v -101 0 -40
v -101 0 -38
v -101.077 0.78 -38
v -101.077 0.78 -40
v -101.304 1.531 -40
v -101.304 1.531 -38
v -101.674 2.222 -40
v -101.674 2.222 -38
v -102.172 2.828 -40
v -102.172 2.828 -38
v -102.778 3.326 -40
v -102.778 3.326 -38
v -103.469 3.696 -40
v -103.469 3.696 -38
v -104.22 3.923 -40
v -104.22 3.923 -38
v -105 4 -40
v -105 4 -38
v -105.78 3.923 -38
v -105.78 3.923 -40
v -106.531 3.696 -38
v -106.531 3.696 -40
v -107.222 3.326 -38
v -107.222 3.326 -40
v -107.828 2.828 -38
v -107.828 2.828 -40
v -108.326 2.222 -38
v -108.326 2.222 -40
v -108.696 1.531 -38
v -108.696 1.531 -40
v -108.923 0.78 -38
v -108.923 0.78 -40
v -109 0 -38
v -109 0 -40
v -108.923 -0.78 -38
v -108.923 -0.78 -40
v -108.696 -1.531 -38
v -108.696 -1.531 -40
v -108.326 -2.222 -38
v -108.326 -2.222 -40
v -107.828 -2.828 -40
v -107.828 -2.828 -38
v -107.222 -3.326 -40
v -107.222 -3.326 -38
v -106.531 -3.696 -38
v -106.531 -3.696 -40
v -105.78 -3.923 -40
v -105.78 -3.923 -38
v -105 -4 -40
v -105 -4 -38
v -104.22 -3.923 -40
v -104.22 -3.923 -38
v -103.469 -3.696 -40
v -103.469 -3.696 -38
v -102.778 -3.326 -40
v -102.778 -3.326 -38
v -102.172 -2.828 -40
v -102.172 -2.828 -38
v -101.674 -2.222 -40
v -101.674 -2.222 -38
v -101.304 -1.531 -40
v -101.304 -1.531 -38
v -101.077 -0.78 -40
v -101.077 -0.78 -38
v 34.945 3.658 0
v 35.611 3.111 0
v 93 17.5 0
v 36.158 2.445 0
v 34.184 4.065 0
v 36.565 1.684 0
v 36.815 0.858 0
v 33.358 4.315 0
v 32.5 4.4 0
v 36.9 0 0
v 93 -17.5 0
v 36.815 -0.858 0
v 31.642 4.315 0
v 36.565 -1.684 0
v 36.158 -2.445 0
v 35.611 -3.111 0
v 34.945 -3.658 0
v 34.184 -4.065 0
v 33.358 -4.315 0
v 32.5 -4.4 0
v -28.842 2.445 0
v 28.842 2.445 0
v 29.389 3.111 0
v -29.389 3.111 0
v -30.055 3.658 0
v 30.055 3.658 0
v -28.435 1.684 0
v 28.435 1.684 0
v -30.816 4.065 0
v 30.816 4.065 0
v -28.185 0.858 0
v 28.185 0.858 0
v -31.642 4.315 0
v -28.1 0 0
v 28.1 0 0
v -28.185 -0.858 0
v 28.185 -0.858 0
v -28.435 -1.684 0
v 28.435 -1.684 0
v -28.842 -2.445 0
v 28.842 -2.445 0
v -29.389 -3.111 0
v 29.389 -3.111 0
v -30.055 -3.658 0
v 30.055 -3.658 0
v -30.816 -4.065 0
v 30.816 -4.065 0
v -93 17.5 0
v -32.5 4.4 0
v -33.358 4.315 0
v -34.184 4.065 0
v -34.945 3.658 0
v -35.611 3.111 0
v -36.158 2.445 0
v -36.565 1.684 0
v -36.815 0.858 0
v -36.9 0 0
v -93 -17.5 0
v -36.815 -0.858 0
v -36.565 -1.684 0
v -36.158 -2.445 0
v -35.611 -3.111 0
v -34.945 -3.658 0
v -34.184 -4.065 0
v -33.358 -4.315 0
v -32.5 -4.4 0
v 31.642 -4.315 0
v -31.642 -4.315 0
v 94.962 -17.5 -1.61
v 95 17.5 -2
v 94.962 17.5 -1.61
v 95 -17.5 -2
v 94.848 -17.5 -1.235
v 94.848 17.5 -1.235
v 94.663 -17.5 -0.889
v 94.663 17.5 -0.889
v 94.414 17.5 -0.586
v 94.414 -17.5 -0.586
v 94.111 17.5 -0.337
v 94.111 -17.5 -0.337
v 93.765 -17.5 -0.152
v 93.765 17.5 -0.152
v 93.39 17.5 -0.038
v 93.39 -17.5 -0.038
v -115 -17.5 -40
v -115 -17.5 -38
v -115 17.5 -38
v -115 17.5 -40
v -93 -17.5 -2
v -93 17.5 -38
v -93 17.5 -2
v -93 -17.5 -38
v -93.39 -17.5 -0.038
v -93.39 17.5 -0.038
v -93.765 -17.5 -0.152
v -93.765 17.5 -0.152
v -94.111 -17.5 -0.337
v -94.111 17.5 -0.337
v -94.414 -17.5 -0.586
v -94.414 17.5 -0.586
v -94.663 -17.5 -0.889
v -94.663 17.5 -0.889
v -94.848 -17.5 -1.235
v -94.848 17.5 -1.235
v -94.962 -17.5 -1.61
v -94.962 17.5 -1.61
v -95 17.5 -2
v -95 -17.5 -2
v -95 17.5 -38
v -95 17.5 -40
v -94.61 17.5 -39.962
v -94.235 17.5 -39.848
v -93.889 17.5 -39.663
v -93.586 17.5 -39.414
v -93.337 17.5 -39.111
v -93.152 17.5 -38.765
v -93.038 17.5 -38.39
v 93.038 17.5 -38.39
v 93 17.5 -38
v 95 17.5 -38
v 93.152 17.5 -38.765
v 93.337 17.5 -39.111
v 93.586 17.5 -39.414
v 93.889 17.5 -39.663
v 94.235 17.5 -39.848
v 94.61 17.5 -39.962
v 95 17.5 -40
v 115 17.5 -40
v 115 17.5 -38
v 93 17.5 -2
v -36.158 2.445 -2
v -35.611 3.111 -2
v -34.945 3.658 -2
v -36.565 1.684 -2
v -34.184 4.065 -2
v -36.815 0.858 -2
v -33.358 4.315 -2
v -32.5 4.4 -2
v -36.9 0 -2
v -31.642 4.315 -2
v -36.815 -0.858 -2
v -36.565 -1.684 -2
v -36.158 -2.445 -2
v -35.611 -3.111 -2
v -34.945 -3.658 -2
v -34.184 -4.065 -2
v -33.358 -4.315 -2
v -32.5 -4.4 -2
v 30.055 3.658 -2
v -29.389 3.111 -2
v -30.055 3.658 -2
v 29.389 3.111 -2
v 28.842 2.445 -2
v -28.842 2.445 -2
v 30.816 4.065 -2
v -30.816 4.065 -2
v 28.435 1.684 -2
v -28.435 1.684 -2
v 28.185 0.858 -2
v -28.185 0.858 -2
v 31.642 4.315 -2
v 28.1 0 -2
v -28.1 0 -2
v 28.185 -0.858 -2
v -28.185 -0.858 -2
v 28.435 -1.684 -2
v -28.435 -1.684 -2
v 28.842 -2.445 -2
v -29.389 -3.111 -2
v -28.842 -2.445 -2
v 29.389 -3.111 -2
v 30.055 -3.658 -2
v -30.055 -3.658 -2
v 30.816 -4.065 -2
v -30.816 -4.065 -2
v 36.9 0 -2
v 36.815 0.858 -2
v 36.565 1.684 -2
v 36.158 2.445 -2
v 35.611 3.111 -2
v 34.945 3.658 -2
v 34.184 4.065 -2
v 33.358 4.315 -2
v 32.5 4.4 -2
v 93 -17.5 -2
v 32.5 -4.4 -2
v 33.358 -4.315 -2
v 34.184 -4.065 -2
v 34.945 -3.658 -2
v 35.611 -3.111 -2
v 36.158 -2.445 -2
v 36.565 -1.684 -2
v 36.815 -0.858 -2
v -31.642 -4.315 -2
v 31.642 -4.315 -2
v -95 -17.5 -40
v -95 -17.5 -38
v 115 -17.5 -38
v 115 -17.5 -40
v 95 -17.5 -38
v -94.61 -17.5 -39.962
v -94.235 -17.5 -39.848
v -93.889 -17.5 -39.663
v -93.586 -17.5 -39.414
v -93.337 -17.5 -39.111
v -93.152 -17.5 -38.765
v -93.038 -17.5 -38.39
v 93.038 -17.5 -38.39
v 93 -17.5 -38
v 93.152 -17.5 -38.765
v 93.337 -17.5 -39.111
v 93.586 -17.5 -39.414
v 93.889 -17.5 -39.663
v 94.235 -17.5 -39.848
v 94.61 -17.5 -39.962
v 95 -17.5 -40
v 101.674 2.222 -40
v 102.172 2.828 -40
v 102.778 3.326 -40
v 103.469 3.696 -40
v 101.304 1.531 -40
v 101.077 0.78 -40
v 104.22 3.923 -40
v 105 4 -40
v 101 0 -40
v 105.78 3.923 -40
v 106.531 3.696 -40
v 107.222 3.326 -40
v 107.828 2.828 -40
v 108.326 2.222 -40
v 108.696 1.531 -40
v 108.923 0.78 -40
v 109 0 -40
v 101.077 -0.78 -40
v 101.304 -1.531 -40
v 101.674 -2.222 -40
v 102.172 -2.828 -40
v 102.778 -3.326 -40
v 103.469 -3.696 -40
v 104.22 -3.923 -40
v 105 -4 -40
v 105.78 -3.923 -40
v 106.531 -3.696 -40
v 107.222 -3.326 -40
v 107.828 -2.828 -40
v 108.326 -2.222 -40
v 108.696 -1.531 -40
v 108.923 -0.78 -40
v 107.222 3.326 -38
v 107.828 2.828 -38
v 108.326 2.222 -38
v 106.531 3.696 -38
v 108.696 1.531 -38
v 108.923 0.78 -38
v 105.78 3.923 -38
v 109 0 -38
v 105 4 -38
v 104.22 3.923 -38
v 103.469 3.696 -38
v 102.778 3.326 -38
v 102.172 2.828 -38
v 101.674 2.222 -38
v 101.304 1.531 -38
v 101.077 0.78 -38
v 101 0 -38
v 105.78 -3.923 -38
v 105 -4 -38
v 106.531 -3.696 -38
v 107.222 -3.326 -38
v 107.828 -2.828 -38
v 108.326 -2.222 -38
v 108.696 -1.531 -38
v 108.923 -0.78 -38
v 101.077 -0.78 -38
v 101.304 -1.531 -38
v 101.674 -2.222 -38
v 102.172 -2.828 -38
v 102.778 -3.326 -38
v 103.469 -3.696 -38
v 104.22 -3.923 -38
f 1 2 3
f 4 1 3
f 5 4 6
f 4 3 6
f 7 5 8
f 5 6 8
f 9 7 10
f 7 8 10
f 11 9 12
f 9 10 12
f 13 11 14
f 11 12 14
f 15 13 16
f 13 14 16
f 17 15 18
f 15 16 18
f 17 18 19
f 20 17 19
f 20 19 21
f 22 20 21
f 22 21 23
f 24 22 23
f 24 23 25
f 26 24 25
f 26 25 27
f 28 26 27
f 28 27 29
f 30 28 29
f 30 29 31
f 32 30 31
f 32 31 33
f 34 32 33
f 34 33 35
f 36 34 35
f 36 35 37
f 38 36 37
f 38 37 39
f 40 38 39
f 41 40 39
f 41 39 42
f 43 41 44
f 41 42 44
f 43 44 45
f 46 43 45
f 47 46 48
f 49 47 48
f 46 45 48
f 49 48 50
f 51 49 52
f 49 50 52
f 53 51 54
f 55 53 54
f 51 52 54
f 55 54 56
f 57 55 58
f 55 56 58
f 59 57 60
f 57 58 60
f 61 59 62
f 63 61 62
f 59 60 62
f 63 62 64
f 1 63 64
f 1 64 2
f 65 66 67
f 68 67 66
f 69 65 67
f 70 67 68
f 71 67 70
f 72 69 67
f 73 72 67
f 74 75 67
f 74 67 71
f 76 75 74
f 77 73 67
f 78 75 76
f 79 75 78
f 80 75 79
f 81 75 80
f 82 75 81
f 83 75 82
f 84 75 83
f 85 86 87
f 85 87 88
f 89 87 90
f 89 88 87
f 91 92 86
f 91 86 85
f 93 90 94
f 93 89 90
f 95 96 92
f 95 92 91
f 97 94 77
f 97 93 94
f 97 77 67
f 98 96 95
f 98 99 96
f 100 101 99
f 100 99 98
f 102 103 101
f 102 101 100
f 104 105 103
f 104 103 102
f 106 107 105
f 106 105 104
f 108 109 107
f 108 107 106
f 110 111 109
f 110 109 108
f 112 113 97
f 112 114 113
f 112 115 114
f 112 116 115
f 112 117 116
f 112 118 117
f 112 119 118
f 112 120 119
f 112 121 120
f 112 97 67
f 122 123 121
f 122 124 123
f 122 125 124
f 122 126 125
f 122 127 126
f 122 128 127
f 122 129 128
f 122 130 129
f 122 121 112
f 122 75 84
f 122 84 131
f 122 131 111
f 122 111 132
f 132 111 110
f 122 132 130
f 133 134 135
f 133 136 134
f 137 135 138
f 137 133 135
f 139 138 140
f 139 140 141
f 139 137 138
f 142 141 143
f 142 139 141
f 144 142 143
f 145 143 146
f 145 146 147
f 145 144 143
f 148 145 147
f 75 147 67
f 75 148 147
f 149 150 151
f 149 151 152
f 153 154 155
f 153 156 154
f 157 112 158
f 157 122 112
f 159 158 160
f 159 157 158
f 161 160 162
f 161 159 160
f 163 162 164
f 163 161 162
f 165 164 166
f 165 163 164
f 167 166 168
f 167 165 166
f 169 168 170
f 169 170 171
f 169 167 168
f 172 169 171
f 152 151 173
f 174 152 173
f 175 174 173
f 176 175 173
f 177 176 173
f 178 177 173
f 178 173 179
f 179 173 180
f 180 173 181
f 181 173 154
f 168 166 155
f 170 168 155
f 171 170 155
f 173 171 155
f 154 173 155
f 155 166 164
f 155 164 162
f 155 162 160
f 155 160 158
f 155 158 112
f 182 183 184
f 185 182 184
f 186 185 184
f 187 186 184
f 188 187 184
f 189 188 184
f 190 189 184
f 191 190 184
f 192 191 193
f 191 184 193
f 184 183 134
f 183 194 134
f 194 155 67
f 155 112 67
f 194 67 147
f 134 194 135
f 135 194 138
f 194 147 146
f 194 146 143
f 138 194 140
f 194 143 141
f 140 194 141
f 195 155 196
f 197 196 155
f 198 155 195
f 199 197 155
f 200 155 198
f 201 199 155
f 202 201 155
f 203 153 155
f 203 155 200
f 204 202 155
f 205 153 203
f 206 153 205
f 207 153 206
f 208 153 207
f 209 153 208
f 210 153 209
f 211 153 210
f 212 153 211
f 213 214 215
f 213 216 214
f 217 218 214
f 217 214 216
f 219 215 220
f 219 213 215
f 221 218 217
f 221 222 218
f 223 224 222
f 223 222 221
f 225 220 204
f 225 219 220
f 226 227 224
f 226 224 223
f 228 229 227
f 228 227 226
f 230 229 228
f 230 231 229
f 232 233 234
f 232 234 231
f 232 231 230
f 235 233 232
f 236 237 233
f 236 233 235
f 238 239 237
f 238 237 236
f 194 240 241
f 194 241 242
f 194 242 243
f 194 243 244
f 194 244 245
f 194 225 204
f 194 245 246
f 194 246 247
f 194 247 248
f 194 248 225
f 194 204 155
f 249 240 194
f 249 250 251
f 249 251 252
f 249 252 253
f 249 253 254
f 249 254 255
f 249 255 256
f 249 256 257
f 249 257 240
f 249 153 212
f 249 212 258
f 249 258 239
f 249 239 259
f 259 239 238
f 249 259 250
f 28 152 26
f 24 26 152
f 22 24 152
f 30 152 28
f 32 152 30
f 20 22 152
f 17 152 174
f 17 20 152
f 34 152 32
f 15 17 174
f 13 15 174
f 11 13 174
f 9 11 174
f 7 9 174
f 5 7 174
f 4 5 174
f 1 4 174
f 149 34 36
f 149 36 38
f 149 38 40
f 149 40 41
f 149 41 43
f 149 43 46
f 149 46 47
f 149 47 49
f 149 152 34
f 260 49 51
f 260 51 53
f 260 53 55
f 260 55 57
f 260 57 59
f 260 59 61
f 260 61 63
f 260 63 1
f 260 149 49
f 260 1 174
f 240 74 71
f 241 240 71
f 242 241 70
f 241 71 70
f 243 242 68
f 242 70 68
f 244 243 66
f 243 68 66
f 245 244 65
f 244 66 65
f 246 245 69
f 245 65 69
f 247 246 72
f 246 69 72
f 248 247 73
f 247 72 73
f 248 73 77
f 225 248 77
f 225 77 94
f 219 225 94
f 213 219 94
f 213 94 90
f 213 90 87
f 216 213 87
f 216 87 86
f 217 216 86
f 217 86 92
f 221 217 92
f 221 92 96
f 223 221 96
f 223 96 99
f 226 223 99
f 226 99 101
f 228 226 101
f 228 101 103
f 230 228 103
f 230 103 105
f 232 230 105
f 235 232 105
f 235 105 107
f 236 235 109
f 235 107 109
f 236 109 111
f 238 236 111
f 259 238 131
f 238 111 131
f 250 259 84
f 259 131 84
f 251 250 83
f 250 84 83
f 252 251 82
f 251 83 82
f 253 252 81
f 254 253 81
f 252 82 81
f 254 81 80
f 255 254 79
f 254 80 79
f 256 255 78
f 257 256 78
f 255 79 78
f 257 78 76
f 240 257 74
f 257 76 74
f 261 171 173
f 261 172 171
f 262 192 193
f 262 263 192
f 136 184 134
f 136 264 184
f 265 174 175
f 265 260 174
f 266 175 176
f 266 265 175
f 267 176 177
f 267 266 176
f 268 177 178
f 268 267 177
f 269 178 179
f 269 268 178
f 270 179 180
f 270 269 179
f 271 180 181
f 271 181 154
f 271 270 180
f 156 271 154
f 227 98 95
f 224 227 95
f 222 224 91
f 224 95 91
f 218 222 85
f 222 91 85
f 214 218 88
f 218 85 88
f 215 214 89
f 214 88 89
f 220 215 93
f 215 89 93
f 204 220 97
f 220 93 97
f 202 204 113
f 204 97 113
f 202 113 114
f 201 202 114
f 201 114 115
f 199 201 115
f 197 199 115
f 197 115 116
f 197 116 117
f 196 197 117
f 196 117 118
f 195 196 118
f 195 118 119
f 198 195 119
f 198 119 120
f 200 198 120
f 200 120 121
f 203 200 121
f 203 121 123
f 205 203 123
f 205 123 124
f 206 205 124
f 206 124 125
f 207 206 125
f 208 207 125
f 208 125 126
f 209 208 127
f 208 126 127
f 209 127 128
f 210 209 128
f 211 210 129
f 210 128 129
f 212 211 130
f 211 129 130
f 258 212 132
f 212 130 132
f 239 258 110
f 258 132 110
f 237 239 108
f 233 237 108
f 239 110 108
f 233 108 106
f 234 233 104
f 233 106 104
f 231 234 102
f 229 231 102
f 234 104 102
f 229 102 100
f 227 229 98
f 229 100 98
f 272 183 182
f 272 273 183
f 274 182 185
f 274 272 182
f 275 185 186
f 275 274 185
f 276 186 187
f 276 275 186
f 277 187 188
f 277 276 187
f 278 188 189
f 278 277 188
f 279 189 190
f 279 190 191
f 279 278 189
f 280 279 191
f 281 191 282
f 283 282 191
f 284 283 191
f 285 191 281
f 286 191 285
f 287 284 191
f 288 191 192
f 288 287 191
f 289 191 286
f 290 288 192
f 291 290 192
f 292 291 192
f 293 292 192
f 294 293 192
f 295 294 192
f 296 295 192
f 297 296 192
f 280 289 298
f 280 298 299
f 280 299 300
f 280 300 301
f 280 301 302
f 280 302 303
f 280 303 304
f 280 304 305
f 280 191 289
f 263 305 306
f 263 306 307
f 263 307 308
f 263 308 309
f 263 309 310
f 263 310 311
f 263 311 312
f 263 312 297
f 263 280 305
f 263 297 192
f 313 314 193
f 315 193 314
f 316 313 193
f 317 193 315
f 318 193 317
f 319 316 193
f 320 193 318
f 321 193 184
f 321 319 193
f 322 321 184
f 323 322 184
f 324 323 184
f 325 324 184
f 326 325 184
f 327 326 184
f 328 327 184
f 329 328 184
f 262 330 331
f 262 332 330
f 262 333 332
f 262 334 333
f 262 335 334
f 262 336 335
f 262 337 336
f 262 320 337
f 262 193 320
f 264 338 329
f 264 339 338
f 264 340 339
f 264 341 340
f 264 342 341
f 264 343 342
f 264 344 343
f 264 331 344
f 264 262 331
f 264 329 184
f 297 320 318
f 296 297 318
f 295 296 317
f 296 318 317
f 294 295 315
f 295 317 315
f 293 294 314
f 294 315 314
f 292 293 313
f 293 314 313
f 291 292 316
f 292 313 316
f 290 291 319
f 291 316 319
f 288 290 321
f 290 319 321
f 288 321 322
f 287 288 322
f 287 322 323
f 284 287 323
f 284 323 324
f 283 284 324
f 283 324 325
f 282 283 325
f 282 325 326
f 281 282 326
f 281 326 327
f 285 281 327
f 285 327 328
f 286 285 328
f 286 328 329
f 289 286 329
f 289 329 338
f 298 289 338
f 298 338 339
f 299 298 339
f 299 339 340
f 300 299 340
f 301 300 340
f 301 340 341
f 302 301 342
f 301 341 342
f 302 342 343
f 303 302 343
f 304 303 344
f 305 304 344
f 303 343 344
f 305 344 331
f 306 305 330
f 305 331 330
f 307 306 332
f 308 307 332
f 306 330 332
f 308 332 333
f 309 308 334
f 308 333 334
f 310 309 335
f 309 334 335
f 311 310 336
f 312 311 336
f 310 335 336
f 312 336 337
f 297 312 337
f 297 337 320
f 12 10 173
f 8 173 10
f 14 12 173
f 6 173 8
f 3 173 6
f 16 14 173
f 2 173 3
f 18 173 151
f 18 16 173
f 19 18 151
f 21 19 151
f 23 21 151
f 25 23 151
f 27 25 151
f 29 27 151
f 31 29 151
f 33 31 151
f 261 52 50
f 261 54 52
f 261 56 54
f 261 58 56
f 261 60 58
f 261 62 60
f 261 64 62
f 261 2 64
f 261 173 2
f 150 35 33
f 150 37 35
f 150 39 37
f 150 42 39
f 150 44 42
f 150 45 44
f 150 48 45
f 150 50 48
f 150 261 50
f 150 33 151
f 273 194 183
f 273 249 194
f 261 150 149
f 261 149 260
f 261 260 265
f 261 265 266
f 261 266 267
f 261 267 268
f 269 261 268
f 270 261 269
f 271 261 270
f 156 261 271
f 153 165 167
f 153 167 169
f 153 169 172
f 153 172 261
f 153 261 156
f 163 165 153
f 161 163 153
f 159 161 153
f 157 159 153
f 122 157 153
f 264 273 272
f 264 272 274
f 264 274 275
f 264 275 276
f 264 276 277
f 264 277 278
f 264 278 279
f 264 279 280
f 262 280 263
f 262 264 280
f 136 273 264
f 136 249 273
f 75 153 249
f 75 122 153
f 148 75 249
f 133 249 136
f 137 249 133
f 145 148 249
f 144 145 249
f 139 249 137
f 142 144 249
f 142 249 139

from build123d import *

# Parameters (mm, degrees)
F1_DEPTH = 17.5
F2_R     = 4
F3_DEPTH = 25
F4_R     = 4.4
F5_DEPTH = 25
F6_R     = 2


# Not quite as in the source:
# - a feature names something its author has since deleted; it is built from what else it names


with BuildPart() as f1:
    # F0 (on Front) → F1 (new body, symmetric)
    with BuildSketch(Plane.XZ):
        Polygon((95, -38), (95, 0), (-95, 0), (-95, -38), (-115, -38), (-115, -40), (-93, -40), (-93, -2), (93, -2), (93, -40), (115, -40), (115, -38), align=None)
    extrude(amount=F1_DEPTH, both=True)

    # F2 (on face) → F3 (cut)
    with BuildSketch(Plane.XY.offset(-38)):
        with Locations((-105, 0)):
            Circle(F2_R)
        with Locations((105, 0)):
            Circle(F2_R)
    extrude(amount=-F3_DEPTH, mode=Mode.SUBTRACT)

    # F4 (on face) → F5 (cut)
    with BuildSketch(Plane.XY):
        with Locations((-32.5, 0)):
            Circle(F4_R)
        with Locations((32.5, 0)):
            Circle(F4_R)
    extrude(amount=-F5_DEPTH, mode=Mode.SUBTRACT)

    # F6
    f6_edges = [f1.edges().sort_by_distance(p)[0] for p in [
        (95, 0, 0),
        (-95, 0, 0),
        (-93, 0, -40),
        (93, 0, -40),
    ]]
    fillet(f6_edges, radius=F6_R)


solid = f1.part
